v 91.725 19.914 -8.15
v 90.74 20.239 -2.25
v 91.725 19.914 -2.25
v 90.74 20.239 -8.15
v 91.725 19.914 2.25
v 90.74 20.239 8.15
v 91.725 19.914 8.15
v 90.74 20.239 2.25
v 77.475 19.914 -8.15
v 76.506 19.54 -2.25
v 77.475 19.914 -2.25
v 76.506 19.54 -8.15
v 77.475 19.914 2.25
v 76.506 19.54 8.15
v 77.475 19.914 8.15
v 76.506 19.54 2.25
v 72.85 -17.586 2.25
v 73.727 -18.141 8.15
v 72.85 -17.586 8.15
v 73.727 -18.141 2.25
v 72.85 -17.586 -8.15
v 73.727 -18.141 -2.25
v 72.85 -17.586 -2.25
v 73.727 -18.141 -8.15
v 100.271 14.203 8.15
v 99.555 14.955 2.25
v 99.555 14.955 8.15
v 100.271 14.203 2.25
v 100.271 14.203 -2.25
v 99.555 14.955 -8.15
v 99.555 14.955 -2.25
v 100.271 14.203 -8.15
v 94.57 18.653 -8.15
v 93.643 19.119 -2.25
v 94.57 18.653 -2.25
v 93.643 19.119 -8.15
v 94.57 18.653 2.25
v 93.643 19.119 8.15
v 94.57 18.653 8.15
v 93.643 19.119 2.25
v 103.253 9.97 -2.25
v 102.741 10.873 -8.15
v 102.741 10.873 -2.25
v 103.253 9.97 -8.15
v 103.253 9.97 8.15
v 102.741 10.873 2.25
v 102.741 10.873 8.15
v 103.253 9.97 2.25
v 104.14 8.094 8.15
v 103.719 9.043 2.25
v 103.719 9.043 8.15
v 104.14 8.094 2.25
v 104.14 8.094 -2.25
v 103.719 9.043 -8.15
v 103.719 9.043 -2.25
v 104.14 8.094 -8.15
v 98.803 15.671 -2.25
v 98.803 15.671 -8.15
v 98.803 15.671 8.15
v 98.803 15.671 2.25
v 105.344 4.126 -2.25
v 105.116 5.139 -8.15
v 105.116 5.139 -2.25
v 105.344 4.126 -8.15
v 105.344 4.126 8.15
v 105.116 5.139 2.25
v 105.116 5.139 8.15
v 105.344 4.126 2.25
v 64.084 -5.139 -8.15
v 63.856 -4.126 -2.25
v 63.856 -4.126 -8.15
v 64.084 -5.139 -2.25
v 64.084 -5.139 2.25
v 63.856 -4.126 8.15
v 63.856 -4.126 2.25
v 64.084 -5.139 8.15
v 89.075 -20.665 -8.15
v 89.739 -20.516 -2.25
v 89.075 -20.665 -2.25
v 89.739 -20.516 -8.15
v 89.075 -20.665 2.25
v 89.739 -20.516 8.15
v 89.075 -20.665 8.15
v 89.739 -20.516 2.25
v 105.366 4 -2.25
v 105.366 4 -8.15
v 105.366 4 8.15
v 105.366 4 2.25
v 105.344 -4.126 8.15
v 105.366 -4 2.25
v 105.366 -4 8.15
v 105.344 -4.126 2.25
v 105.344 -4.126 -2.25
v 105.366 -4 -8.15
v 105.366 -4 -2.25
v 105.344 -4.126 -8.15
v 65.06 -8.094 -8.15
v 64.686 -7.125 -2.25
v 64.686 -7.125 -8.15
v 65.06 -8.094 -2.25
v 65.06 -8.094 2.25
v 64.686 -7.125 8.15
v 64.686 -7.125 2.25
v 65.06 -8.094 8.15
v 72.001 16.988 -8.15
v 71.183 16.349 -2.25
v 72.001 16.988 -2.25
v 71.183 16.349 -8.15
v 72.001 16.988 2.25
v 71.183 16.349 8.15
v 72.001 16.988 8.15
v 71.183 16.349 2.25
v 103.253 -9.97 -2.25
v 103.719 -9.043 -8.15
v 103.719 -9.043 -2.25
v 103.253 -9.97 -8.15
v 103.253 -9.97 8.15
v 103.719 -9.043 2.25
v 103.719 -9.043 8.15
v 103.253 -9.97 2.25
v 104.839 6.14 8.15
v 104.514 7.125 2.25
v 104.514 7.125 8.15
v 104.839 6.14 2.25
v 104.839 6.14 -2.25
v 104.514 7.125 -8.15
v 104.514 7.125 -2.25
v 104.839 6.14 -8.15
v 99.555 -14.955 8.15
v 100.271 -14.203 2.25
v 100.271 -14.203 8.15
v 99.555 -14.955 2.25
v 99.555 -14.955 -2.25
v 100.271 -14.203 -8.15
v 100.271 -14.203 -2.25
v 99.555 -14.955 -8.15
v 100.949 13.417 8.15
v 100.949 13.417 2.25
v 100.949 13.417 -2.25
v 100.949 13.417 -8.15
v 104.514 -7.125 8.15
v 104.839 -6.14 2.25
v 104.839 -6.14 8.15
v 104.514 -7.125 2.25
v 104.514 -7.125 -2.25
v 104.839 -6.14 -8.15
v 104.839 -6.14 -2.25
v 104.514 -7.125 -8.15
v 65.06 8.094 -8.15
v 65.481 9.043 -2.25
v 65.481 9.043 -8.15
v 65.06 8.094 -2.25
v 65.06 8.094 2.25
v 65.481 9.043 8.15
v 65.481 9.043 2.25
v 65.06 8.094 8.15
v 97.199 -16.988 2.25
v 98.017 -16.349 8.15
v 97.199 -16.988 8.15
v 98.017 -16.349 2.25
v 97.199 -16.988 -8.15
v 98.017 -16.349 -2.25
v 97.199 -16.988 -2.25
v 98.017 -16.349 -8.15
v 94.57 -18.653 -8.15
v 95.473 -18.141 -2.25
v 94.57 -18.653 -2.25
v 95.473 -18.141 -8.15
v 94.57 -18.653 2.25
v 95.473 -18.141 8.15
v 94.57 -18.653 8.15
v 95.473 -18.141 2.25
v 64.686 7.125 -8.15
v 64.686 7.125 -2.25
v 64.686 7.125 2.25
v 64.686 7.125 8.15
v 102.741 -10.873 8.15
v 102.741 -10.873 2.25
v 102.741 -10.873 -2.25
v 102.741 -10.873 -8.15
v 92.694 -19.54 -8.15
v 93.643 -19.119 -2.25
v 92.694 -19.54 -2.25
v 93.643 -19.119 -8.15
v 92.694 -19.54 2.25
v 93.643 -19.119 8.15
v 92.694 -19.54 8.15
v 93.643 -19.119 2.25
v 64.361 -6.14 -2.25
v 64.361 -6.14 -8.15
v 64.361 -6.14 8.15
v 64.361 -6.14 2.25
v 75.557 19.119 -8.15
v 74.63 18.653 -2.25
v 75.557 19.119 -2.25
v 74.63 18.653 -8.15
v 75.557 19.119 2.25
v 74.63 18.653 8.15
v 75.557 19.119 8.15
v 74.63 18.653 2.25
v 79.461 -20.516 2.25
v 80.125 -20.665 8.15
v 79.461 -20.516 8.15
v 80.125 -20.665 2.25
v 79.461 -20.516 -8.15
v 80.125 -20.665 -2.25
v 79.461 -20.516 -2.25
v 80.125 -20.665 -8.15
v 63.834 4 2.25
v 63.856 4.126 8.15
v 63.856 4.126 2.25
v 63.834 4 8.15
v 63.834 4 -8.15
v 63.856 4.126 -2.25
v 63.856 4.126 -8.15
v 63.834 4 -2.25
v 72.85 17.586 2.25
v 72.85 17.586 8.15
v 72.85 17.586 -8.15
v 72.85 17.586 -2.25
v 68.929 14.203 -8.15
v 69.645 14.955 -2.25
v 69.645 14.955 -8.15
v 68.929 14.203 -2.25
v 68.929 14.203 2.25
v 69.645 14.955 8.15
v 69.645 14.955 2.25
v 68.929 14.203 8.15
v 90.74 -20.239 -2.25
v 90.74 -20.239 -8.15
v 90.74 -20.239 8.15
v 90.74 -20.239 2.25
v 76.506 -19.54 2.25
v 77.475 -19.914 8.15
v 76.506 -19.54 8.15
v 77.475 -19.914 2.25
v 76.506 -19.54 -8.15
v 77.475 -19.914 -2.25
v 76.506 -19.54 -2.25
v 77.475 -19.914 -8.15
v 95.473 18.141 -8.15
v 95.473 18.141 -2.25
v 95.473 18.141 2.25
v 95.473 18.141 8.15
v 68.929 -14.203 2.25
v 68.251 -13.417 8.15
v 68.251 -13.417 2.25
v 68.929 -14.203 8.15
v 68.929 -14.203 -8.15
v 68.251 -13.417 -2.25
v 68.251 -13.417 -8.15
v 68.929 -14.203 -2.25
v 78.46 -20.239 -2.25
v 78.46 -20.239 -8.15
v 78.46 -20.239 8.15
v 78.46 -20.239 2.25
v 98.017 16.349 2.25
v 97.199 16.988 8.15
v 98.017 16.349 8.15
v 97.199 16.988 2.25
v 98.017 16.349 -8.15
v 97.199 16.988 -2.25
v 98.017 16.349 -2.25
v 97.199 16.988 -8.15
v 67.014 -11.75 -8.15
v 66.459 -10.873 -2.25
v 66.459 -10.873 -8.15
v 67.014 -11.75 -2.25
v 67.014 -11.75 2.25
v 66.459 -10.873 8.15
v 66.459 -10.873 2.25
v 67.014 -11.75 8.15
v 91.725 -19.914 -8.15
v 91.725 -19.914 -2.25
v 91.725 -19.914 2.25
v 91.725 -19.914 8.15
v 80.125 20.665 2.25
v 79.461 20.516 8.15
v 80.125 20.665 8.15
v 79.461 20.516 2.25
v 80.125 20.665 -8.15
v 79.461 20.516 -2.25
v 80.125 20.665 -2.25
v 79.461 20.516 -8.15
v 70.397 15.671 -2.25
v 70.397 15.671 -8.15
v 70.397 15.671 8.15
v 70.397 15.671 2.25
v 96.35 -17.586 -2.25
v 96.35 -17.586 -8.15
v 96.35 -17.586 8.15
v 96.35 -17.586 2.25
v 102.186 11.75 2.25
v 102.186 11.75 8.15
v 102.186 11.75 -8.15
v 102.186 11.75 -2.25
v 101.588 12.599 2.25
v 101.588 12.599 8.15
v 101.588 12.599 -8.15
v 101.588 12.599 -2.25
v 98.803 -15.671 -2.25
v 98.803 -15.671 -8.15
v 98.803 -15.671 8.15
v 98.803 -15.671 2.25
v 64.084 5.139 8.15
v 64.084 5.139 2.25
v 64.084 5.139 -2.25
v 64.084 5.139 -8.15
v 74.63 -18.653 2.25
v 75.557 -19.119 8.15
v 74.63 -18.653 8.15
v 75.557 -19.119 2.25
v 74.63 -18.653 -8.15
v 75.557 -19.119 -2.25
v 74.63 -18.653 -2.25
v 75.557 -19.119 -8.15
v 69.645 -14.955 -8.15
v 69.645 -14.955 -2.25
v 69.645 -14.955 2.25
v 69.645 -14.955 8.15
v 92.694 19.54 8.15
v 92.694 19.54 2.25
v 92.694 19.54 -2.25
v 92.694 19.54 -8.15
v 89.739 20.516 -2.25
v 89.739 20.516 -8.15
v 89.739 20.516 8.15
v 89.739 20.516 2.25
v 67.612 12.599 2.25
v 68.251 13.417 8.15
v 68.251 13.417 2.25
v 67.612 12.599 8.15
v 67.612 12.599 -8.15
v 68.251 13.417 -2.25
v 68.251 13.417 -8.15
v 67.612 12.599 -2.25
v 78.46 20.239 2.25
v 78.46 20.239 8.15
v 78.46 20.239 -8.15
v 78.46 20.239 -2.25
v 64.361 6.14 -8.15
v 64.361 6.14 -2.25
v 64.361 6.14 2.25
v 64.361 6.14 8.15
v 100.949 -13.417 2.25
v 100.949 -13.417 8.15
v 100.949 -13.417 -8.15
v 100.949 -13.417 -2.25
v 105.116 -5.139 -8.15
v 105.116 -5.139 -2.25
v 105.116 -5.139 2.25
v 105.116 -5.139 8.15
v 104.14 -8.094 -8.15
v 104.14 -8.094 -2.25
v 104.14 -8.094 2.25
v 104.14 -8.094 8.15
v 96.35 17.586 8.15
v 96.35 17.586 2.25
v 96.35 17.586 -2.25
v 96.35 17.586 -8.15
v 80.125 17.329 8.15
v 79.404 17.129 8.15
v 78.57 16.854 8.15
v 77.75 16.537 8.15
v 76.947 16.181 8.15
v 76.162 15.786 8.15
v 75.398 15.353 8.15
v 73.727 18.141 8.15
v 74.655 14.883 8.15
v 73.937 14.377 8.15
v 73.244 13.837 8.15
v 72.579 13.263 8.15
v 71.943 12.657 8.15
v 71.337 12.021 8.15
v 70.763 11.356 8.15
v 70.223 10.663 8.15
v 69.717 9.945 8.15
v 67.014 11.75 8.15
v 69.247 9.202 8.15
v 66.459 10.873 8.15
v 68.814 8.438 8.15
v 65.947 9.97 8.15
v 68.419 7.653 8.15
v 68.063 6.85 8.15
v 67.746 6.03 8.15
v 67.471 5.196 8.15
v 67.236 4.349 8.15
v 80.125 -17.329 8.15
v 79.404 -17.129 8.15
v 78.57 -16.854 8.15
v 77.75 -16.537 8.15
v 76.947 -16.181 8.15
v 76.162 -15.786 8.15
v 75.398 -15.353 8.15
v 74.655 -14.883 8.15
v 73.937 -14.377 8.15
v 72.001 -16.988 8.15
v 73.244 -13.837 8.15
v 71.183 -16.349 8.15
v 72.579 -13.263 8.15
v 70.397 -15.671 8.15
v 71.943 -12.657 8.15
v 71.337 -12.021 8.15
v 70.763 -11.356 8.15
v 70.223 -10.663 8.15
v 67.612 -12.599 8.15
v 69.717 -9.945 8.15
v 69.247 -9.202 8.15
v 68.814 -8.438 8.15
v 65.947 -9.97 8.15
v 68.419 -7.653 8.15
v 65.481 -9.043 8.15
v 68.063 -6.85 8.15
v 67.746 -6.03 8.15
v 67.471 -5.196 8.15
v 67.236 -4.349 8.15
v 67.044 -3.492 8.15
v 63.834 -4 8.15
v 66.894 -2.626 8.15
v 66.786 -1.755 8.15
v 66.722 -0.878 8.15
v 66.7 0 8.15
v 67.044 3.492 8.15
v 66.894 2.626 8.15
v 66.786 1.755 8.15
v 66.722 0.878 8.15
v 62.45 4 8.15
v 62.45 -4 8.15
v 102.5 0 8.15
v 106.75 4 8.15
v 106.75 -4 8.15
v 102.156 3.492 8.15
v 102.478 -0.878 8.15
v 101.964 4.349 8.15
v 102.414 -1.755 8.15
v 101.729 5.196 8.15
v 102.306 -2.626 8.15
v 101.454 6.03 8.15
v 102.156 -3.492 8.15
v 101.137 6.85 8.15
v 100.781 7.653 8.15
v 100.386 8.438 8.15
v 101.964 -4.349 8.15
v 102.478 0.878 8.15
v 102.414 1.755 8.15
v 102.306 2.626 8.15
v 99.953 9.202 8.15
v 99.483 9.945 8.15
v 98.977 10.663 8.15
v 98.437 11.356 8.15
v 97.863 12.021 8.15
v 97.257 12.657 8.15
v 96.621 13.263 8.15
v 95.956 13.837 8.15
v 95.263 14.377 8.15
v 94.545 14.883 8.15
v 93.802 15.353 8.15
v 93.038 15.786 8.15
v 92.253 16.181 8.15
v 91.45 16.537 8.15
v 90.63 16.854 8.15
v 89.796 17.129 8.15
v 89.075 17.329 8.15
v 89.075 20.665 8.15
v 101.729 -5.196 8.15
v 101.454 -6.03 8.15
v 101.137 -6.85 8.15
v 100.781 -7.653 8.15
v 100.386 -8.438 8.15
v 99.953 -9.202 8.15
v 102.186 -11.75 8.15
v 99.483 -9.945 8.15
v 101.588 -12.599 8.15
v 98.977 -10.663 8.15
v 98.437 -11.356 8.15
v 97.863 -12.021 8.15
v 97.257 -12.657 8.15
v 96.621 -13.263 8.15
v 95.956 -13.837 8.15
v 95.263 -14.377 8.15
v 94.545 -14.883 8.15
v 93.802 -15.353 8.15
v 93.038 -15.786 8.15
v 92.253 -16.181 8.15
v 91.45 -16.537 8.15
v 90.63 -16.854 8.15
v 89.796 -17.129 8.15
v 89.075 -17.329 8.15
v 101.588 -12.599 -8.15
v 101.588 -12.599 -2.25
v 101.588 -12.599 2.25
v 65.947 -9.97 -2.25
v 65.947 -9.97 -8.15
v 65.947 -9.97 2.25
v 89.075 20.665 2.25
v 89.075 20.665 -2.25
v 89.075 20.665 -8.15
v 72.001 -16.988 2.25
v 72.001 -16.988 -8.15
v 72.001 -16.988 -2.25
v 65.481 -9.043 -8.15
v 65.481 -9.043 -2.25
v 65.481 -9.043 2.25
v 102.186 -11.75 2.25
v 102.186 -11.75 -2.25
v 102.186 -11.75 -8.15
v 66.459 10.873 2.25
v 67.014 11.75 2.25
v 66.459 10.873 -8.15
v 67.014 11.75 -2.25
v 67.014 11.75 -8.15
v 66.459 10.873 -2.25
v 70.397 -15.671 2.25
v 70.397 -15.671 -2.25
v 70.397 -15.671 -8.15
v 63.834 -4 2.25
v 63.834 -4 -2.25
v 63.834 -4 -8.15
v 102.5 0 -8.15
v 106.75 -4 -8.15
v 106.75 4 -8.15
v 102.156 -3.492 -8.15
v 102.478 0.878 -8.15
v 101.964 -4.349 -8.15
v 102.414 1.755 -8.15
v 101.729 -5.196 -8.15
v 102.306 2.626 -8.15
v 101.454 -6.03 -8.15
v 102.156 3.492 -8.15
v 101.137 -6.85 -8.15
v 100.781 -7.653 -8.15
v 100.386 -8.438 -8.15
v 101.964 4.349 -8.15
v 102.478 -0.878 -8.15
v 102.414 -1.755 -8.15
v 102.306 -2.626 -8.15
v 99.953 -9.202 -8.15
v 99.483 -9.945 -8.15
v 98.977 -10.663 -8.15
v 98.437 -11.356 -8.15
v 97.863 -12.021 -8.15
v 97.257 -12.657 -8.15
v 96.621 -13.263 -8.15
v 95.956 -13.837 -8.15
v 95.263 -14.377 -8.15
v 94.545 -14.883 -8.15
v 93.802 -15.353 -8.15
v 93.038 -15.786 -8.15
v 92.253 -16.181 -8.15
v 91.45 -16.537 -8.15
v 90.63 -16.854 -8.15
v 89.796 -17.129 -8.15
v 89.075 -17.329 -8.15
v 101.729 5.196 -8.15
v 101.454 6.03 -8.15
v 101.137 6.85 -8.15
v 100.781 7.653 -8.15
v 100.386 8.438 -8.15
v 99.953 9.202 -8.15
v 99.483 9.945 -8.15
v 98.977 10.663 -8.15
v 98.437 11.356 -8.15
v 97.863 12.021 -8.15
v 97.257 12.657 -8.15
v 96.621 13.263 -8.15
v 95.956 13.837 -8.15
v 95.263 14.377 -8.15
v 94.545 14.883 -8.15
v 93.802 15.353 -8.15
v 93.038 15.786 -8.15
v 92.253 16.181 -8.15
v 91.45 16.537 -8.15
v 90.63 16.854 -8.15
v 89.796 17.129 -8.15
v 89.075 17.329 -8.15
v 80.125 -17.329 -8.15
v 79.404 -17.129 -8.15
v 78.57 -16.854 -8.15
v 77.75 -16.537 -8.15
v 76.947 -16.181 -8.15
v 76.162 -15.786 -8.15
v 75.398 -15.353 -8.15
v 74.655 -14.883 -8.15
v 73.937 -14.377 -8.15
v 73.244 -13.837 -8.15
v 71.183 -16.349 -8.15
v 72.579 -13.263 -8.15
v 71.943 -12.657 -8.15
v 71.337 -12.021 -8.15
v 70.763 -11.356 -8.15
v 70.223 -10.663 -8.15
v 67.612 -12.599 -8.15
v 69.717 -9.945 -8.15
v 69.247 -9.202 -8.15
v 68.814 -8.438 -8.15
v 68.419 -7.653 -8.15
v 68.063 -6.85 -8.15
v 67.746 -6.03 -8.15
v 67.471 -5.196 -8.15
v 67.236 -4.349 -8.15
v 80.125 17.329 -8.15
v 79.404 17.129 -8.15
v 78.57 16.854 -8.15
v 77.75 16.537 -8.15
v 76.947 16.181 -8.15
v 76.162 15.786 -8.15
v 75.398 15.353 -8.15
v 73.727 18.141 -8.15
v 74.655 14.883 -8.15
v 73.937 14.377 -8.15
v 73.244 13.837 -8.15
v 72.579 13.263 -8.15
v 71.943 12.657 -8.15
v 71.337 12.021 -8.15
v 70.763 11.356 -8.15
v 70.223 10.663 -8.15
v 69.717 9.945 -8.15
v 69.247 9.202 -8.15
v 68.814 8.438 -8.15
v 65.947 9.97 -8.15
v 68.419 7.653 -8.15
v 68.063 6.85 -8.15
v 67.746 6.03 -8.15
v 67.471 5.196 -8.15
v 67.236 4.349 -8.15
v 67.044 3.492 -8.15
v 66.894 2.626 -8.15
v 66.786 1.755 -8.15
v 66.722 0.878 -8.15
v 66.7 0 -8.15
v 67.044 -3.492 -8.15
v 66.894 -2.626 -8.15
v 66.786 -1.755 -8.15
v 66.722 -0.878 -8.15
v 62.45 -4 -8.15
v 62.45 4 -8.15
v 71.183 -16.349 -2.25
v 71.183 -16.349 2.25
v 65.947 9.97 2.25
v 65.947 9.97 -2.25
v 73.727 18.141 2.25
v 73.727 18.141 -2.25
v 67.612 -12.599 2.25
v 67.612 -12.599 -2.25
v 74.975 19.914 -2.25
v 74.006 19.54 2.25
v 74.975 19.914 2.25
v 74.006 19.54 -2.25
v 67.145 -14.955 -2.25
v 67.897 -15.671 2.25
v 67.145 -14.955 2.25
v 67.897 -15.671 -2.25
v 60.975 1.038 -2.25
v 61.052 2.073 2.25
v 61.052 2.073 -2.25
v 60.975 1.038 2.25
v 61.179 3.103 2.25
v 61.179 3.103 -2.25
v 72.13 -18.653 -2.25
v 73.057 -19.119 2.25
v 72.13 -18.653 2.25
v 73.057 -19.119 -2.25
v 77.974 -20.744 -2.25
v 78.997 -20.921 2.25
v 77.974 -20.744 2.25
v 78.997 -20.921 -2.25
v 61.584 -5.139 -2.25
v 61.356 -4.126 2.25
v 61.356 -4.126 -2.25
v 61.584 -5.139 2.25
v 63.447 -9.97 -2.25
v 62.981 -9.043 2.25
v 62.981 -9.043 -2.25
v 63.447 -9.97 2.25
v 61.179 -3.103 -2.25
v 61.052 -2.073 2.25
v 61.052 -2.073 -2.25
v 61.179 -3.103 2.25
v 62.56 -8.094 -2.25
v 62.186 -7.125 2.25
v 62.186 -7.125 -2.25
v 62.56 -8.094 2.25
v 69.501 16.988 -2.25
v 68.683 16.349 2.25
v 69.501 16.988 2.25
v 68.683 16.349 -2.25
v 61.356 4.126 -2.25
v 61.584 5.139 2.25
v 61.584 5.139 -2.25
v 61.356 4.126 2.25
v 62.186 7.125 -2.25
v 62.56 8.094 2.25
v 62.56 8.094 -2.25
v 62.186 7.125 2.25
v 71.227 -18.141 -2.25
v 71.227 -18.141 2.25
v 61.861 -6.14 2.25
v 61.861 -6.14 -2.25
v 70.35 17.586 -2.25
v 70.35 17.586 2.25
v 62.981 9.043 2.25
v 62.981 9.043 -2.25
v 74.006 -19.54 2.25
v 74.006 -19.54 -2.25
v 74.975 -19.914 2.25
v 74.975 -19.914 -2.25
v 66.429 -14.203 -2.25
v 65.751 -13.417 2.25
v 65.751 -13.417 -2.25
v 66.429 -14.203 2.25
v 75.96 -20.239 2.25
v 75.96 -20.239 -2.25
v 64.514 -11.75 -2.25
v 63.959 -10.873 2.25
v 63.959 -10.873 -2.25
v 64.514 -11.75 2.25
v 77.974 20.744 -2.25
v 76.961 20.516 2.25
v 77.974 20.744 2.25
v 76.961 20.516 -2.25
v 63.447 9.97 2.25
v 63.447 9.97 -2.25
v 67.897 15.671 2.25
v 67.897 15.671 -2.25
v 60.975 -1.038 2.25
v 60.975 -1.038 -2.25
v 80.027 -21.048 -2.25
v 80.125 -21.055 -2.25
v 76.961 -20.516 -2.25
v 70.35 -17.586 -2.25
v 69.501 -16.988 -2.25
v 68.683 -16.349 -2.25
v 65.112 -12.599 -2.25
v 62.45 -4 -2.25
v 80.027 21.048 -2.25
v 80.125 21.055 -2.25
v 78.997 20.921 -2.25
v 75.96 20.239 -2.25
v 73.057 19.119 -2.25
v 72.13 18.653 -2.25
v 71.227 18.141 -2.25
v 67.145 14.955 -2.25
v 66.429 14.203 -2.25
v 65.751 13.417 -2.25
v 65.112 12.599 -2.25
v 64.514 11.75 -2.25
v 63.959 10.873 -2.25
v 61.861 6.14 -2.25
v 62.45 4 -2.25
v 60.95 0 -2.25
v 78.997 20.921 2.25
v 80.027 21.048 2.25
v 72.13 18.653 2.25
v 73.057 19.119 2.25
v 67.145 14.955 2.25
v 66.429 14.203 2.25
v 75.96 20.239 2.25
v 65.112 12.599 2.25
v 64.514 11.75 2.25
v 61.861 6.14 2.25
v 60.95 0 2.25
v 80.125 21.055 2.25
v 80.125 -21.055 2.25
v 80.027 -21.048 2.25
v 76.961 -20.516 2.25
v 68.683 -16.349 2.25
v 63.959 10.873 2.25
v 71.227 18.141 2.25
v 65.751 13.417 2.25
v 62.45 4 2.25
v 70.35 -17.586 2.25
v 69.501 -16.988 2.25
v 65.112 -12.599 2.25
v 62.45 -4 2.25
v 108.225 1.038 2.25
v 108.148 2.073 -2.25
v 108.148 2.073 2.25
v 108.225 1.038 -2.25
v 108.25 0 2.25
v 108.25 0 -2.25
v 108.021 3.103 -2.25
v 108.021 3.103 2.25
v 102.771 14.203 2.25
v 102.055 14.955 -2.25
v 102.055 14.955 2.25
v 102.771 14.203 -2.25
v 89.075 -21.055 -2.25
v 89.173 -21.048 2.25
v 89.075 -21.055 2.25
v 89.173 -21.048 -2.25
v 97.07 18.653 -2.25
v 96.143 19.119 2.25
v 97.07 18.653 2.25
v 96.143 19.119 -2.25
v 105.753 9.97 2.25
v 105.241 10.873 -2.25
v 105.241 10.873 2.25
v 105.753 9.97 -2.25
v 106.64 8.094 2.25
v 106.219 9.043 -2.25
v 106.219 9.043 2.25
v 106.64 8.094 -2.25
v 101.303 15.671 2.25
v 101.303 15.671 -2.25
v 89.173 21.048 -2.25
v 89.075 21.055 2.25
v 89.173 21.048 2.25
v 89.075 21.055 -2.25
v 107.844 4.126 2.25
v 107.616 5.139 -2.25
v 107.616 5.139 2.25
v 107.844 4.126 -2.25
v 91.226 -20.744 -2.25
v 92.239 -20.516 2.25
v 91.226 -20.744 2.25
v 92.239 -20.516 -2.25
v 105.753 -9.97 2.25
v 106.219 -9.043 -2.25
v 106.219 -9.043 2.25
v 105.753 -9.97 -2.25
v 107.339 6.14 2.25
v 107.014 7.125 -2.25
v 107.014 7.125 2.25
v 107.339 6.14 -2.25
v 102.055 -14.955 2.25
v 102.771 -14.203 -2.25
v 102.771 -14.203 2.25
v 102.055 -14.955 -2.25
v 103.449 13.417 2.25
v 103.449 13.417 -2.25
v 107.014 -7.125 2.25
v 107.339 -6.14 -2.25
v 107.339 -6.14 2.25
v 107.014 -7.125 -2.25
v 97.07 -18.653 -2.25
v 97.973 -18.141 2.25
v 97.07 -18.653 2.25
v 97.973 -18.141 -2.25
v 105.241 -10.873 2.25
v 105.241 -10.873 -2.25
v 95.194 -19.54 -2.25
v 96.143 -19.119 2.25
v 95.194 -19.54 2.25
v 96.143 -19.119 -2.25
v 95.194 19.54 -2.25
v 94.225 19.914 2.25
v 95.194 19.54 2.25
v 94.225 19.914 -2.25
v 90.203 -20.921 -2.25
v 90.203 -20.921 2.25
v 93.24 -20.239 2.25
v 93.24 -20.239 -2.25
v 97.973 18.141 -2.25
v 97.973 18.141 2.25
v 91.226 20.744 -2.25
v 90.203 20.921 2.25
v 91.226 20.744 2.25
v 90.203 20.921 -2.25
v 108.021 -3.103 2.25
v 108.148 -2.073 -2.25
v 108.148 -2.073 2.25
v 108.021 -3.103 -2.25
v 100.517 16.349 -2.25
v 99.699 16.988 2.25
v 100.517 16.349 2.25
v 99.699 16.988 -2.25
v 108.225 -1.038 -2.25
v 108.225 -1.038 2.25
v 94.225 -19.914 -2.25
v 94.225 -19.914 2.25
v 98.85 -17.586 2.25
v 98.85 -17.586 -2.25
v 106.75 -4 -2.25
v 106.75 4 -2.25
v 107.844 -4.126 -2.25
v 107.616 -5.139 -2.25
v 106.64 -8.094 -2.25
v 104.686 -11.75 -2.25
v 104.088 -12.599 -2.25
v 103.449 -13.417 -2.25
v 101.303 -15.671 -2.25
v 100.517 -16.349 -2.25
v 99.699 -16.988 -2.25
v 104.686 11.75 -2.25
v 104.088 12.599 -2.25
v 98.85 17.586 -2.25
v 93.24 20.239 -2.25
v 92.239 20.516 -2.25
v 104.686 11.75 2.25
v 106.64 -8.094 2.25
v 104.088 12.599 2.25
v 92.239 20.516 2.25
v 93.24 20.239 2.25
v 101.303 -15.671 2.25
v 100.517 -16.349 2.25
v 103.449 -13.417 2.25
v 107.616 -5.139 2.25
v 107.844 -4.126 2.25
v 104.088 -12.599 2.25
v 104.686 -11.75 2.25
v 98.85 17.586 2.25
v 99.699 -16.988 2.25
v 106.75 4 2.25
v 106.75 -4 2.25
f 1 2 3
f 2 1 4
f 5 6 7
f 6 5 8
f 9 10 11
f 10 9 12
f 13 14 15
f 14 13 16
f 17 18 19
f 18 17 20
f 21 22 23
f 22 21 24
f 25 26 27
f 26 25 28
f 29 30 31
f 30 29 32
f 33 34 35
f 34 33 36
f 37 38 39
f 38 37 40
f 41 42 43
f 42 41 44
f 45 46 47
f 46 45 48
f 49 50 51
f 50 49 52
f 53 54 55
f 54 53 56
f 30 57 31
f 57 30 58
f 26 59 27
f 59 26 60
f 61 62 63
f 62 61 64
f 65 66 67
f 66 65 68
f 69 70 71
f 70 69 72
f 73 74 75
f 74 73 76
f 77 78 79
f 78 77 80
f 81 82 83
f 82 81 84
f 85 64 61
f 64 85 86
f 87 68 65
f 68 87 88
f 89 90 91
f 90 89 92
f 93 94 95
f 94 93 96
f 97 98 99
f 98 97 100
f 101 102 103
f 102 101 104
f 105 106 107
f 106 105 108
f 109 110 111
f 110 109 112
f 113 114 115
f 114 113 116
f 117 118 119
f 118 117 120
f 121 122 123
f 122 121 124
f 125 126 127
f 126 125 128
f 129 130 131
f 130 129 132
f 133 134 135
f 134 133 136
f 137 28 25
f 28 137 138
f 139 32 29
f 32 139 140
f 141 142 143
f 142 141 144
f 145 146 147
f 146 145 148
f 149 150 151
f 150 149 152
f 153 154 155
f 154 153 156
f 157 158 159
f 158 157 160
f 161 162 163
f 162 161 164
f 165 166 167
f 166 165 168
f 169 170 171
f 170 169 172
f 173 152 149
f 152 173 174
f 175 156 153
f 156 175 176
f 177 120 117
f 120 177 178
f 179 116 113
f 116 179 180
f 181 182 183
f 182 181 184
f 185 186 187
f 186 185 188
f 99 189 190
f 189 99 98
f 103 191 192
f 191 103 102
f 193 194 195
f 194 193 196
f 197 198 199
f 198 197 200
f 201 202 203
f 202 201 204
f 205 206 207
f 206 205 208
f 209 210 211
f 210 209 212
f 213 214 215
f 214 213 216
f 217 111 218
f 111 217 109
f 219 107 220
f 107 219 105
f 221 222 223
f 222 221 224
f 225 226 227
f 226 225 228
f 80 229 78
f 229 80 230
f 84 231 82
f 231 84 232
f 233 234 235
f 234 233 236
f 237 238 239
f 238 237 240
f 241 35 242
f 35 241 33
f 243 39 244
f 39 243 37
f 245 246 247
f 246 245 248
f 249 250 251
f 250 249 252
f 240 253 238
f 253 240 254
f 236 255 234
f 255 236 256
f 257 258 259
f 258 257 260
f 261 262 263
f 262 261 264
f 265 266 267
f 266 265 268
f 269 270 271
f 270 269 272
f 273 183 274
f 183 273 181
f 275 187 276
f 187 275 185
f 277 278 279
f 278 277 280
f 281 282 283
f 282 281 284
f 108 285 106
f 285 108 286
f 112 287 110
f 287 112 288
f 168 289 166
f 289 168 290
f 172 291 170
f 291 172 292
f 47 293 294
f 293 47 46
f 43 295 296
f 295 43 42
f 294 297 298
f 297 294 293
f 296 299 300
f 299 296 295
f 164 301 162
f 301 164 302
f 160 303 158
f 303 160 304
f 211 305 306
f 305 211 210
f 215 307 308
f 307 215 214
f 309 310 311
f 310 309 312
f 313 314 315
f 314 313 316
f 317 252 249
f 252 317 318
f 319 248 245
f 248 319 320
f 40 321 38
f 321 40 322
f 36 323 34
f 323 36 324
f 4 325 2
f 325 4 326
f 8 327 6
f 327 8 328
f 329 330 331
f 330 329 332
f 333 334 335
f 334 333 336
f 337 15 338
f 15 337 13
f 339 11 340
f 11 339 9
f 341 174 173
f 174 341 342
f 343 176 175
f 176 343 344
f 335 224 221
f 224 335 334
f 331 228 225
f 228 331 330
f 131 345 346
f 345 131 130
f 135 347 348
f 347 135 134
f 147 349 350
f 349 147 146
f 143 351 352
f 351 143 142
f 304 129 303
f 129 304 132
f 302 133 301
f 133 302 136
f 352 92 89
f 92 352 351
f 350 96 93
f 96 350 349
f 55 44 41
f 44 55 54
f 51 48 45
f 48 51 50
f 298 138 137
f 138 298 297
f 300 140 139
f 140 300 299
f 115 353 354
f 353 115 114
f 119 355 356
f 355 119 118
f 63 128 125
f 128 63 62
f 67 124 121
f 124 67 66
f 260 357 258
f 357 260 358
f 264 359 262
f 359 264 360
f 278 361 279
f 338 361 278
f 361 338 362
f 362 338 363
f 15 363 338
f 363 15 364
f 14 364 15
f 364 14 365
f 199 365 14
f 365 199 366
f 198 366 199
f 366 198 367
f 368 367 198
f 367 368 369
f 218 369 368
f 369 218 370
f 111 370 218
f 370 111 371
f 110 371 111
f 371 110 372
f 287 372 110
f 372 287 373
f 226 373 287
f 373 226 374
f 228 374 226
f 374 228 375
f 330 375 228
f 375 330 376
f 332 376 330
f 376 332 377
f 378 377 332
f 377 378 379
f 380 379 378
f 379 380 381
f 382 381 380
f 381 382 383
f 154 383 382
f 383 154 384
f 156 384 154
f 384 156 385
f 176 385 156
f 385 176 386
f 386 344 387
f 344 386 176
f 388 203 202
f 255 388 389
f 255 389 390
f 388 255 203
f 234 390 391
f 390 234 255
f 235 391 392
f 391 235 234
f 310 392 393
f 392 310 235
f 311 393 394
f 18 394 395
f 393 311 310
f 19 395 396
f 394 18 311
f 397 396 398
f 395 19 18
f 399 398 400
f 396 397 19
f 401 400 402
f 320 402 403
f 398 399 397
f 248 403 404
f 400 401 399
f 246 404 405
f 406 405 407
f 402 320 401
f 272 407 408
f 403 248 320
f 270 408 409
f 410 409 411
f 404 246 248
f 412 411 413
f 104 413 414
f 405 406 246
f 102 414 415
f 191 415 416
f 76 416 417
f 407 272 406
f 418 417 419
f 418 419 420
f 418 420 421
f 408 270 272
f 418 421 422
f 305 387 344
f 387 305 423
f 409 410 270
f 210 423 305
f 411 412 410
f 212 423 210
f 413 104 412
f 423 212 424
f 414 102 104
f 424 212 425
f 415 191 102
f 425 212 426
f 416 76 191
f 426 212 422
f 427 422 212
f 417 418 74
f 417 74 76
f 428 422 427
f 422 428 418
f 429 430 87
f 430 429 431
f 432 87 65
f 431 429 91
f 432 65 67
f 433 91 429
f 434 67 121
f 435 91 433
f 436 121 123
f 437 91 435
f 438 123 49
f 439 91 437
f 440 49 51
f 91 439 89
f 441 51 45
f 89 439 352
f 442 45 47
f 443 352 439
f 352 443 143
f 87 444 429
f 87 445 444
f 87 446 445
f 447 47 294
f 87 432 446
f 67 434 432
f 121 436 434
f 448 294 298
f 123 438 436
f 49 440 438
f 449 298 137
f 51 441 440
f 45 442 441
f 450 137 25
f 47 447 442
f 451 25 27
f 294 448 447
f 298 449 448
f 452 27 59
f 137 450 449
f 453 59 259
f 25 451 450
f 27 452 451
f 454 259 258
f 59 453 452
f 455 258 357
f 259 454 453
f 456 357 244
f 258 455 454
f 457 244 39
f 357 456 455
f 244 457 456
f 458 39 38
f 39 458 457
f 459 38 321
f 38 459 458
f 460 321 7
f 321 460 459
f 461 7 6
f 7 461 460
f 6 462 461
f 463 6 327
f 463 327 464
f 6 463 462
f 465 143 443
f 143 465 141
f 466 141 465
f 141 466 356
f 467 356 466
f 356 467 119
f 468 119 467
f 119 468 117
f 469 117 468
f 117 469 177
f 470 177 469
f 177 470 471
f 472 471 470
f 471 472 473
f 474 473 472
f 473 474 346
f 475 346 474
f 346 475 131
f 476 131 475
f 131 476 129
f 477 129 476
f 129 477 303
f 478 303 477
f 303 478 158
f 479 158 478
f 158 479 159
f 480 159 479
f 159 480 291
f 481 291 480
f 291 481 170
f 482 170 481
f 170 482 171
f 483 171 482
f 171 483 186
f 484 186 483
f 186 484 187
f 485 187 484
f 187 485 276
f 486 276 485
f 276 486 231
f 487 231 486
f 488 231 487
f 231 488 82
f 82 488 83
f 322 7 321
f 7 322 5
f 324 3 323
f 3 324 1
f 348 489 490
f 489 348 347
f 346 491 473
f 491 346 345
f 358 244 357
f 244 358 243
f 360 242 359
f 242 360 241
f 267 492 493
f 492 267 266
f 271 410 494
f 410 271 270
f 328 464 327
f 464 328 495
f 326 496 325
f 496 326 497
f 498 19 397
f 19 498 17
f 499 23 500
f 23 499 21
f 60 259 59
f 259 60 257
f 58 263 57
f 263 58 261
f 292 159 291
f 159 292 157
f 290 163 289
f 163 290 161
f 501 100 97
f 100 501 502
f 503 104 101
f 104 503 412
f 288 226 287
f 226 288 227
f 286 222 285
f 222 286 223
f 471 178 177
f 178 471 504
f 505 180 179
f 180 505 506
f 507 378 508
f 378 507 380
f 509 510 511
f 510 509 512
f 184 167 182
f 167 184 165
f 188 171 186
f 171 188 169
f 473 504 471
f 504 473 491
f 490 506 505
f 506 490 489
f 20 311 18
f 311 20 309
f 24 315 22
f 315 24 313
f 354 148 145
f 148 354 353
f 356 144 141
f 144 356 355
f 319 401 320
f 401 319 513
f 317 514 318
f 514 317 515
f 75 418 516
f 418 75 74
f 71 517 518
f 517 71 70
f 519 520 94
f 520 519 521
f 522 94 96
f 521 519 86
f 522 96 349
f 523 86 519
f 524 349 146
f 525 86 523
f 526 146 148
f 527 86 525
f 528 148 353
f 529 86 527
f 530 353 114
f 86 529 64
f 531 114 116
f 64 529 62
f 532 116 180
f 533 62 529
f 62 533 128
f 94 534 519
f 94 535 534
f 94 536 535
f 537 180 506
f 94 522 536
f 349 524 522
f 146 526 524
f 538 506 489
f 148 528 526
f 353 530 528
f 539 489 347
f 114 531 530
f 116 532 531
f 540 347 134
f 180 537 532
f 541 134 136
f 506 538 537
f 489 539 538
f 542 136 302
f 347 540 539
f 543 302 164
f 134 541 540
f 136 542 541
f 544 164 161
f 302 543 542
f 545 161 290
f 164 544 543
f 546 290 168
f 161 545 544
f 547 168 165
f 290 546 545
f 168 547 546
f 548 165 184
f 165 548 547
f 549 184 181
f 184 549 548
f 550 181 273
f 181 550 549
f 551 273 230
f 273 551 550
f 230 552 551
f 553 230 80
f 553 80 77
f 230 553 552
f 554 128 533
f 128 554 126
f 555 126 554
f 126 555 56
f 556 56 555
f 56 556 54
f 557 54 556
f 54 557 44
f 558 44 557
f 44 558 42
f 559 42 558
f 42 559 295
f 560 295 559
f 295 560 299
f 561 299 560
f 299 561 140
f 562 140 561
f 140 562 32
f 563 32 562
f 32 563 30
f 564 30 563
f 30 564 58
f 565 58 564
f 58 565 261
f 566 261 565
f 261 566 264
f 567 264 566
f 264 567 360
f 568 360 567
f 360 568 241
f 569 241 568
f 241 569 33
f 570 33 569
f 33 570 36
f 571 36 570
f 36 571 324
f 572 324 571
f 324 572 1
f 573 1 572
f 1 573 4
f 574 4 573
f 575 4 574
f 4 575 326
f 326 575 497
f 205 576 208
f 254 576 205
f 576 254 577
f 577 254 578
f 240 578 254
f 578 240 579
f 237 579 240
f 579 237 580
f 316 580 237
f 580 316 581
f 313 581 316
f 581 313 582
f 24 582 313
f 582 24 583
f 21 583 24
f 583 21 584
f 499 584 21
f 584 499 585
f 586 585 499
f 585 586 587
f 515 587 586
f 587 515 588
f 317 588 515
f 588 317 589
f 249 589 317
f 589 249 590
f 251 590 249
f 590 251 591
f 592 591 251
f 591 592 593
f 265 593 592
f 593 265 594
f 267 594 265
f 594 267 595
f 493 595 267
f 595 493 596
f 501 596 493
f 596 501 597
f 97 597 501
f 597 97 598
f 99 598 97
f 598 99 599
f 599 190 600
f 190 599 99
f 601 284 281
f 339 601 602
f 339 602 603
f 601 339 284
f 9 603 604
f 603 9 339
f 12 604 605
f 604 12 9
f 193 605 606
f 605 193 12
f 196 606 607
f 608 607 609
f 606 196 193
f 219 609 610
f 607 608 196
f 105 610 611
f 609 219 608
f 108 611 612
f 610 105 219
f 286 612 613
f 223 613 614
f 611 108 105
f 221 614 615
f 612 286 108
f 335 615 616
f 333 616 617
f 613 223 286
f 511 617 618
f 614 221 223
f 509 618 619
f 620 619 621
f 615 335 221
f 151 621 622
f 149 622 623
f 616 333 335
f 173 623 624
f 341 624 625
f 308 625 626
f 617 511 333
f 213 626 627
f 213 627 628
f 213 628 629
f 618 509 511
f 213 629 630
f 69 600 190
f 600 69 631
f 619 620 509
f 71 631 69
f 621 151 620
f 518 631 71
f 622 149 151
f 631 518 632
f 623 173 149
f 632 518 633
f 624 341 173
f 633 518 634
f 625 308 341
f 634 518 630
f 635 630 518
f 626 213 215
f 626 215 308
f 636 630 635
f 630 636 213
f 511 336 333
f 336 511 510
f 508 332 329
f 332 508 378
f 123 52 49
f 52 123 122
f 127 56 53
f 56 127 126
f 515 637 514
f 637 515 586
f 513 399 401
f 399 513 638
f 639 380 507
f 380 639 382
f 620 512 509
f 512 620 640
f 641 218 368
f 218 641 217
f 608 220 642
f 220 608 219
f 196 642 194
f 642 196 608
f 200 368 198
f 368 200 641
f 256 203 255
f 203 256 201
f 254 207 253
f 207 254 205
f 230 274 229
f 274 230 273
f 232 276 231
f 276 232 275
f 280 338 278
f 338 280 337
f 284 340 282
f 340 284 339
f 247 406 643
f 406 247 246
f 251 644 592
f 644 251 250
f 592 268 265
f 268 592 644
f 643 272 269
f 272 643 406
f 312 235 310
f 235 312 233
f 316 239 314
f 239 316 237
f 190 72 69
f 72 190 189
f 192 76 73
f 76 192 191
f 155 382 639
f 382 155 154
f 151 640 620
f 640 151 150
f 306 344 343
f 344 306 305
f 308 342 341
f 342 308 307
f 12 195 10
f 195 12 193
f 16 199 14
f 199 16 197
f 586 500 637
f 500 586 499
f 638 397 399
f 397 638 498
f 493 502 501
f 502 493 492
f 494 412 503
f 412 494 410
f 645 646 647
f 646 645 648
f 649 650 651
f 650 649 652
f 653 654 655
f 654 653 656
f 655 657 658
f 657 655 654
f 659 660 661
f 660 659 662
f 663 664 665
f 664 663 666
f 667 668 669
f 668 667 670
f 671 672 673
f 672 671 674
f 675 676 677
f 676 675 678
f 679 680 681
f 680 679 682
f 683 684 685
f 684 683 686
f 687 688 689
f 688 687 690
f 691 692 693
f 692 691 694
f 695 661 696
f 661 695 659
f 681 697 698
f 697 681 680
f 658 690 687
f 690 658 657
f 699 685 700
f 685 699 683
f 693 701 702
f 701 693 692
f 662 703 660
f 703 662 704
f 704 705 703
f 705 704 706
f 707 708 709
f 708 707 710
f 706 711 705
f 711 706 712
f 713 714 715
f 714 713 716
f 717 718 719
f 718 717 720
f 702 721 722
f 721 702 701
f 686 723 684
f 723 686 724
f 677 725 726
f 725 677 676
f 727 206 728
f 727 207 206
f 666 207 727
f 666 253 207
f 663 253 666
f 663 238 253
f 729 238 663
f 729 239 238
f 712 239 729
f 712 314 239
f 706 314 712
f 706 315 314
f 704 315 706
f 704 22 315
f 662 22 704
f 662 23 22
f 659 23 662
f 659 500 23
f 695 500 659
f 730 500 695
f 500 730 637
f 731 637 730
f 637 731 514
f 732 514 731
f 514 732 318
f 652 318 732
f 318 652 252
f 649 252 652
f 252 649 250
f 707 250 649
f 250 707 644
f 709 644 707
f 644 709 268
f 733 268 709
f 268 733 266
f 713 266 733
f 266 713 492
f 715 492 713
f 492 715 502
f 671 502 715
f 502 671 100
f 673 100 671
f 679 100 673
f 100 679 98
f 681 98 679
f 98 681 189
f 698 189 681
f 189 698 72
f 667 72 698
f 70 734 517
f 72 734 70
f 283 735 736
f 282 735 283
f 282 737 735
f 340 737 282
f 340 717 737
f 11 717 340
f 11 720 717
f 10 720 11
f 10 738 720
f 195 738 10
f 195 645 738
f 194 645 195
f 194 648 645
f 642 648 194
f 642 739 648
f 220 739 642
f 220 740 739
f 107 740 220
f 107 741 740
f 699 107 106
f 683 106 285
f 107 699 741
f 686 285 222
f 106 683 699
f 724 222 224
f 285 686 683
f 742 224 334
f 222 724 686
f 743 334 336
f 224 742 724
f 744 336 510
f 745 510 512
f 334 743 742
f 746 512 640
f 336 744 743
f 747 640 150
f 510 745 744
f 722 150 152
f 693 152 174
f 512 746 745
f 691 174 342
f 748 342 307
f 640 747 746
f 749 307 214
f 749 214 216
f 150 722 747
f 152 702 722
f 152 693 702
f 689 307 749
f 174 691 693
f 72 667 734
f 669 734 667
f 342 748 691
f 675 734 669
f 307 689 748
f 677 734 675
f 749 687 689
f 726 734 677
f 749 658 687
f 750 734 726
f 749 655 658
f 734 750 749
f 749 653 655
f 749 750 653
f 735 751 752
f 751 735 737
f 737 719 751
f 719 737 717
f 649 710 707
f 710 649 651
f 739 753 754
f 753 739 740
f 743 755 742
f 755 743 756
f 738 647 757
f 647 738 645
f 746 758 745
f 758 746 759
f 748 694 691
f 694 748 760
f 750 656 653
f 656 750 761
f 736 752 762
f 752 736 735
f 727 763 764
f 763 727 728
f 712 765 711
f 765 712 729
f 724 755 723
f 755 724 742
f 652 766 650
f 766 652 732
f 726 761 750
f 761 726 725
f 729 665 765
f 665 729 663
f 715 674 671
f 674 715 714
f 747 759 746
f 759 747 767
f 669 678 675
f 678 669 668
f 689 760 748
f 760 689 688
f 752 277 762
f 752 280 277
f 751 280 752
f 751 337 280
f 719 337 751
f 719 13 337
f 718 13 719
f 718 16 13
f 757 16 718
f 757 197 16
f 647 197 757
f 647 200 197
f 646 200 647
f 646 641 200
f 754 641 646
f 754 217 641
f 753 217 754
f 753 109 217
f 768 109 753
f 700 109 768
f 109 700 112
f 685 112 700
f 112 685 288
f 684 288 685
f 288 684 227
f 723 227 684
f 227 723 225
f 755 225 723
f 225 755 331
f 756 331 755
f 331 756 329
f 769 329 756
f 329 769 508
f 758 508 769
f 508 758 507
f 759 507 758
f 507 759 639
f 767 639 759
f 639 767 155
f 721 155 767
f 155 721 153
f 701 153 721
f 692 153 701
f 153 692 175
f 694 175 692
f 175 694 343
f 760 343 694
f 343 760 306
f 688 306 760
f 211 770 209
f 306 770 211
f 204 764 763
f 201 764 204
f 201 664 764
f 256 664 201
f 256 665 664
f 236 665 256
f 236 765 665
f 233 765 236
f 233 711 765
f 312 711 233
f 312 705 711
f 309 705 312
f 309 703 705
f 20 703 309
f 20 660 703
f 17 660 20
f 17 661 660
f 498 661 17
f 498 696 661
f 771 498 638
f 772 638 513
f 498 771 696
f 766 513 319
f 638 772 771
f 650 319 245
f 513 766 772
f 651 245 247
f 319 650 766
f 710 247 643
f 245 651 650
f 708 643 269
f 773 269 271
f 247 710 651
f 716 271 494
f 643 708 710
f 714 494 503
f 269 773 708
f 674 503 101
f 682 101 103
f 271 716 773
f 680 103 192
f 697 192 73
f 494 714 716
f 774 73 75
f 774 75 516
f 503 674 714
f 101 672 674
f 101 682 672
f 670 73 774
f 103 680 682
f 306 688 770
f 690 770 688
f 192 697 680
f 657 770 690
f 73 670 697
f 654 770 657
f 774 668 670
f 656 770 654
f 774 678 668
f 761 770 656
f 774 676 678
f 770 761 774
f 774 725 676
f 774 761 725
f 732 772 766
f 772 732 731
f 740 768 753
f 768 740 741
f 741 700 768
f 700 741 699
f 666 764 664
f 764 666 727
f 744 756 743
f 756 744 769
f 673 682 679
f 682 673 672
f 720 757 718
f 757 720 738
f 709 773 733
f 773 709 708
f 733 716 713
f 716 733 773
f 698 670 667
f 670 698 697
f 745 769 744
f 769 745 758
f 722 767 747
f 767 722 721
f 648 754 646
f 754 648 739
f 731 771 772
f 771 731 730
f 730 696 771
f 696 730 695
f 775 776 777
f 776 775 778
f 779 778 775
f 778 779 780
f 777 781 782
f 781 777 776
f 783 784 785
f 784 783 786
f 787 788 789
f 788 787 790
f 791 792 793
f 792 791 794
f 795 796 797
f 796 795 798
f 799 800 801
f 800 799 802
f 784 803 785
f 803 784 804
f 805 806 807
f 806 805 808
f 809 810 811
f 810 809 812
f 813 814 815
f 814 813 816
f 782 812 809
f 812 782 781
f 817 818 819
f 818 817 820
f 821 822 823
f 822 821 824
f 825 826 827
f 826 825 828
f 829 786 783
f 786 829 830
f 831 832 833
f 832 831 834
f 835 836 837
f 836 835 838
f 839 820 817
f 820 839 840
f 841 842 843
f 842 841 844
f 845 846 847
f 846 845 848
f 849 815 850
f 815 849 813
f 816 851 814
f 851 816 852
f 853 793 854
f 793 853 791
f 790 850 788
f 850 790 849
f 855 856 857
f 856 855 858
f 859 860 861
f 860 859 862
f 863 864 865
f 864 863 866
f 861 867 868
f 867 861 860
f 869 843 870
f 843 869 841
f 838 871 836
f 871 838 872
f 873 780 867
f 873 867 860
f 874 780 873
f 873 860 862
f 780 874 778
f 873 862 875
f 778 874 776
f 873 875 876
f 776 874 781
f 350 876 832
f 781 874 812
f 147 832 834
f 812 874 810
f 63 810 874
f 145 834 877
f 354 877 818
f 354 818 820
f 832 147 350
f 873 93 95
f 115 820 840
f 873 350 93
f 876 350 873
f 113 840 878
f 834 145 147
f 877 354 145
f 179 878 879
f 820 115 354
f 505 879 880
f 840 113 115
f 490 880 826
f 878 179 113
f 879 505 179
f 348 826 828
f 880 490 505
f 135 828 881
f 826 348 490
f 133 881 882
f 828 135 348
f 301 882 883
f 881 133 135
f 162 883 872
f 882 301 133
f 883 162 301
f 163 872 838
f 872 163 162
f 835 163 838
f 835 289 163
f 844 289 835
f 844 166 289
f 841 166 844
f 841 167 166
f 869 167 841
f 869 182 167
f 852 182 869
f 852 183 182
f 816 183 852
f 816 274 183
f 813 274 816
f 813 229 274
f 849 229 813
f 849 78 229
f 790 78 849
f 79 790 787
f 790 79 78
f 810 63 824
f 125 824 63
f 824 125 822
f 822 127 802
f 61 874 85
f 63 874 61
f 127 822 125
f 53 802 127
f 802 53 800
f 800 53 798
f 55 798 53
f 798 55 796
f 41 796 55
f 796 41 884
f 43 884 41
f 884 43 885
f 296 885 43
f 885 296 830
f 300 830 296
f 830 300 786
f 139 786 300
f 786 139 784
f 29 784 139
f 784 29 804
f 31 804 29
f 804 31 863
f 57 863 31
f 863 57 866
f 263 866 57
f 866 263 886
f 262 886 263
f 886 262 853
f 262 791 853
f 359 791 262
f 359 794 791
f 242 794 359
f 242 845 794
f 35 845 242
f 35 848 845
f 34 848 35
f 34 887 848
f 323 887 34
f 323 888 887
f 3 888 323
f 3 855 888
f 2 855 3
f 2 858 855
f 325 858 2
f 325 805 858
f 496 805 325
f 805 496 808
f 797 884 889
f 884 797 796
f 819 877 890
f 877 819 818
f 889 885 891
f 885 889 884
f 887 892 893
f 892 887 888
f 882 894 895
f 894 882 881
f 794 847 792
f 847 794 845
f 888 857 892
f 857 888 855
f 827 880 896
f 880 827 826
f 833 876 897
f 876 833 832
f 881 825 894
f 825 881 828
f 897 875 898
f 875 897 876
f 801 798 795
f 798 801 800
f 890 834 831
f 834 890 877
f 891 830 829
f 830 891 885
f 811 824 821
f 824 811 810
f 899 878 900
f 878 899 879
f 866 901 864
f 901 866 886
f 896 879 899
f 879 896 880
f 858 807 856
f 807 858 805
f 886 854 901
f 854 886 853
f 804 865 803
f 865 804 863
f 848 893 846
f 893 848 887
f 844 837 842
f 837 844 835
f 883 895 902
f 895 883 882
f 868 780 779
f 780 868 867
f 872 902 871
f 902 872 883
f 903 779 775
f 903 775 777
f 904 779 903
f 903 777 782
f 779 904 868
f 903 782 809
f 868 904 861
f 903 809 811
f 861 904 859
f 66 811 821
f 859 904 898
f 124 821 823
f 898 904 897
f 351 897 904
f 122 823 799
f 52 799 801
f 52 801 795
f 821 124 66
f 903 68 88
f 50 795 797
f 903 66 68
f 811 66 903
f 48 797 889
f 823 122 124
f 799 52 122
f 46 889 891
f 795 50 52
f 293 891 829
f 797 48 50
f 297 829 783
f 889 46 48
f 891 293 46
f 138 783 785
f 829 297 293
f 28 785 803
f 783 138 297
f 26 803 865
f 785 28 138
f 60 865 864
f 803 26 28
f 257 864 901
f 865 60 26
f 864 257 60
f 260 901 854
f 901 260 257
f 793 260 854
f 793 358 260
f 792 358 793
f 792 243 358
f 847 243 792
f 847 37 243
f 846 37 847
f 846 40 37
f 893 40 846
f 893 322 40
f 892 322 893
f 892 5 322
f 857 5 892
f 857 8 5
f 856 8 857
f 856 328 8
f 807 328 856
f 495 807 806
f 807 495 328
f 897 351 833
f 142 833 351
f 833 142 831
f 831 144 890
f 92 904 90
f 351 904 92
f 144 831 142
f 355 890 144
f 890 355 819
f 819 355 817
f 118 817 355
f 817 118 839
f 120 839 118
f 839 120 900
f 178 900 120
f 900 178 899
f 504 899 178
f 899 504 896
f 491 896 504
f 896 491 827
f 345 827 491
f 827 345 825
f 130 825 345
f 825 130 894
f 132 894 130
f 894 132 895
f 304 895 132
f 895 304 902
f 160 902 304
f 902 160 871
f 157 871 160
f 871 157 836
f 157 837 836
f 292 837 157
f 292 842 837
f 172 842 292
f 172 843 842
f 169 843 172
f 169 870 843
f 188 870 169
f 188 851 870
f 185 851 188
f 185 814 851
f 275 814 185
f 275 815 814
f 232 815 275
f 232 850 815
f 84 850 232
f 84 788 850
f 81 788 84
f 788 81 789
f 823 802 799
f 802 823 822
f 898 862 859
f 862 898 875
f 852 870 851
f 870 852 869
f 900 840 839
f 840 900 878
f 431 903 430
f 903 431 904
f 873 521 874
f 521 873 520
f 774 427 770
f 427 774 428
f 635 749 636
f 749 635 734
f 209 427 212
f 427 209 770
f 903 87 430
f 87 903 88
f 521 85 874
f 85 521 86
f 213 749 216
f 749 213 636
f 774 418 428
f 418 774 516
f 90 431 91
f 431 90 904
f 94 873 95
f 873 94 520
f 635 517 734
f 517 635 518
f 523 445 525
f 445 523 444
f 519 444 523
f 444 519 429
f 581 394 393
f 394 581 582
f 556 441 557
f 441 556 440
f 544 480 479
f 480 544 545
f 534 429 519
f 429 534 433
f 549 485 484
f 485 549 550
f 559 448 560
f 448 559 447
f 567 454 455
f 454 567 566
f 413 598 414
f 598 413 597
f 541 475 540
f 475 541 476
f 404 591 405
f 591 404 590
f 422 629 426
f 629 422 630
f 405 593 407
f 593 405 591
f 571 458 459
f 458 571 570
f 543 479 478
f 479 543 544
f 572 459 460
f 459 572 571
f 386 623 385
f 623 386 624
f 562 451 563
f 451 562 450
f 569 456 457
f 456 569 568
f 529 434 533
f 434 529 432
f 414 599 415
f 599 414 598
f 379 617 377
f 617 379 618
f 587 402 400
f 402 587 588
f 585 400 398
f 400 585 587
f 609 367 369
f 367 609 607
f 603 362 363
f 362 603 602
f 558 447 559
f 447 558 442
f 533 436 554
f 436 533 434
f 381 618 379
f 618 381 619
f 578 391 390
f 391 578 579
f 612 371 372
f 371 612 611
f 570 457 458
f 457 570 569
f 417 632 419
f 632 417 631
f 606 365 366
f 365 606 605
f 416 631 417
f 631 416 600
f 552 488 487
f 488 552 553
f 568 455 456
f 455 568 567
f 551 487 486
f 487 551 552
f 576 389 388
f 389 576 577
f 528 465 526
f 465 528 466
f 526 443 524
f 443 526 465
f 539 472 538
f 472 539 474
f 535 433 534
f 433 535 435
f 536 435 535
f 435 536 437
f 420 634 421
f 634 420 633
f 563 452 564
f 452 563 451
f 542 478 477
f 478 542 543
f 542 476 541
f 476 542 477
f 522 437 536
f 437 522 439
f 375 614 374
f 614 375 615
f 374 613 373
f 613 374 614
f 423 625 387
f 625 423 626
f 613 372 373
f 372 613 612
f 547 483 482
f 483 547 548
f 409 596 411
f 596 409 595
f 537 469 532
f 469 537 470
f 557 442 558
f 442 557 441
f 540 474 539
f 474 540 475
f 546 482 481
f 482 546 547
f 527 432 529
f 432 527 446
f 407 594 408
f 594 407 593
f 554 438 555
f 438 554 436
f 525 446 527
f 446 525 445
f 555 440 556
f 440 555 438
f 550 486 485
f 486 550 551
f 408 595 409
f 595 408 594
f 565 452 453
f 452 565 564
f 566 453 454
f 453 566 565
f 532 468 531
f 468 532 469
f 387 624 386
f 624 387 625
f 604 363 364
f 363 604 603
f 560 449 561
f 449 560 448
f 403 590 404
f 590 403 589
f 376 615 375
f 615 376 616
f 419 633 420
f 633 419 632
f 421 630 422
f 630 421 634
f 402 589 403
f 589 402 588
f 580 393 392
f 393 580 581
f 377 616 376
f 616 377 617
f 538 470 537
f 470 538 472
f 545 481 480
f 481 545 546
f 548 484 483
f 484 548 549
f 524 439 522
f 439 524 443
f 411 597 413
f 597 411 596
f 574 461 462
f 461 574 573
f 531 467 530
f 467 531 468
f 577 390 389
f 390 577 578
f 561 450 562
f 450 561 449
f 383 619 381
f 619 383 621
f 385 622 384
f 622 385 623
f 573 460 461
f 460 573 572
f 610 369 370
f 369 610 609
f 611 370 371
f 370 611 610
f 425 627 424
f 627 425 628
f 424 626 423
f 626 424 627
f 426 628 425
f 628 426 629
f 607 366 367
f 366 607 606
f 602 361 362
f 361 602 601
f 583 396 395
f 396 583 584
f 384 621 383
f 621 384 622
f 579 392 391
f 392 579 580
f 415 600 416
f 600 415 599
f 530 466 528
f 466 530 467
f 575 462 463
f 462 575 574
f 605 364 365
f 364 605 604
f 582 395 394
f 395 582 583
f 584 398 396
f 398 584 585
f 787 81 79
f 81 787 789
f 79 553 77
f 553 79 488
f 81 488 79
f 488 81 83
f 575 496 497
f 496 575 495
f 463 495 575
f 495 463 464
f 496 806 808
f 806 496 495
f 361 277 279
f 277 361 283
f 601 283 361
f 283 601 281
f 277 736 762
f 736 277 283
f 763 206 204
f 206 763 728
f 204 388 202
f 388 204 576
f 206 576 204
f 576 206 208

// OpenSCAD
outer=42.3;
outer2=42.3;
inner=35.8;
h=21;
h2=16.3;
$fs=.2;
$fn=128;

module ring1() {
	difference() {
		union() {
			cylinder(d=outer, h=h, center=true);
			translate([0, 0, h/2]) cylinder(d=outer+6, h=2, center=true);
		}
		cylinder(d=inner, h=h+3, center=true);
		translate([inner/2-1, 0, 0])cube([inner, 3, h+13], center=true);
	}
}

module ring2() {
	difference() {
		union() {
			cylinder(d=outer2, h=h2, center=true);
			translate([-2.5, 0, 0]) cylinder(d=outer2, h=4.5, center=true);
			translate([2.5, 0, 0]) cylinder(d=outer2, h=4.5, center=true);
			cube([outer2+2, 8, h2], center=true);
		}
		cylinder(d=inner, h=h2+3, center=true);
		cube([inner/4, outer2+6, h+13], center=true);
	}
}

//ring1();

translate([2*outer, 0, 0]) ring2();
